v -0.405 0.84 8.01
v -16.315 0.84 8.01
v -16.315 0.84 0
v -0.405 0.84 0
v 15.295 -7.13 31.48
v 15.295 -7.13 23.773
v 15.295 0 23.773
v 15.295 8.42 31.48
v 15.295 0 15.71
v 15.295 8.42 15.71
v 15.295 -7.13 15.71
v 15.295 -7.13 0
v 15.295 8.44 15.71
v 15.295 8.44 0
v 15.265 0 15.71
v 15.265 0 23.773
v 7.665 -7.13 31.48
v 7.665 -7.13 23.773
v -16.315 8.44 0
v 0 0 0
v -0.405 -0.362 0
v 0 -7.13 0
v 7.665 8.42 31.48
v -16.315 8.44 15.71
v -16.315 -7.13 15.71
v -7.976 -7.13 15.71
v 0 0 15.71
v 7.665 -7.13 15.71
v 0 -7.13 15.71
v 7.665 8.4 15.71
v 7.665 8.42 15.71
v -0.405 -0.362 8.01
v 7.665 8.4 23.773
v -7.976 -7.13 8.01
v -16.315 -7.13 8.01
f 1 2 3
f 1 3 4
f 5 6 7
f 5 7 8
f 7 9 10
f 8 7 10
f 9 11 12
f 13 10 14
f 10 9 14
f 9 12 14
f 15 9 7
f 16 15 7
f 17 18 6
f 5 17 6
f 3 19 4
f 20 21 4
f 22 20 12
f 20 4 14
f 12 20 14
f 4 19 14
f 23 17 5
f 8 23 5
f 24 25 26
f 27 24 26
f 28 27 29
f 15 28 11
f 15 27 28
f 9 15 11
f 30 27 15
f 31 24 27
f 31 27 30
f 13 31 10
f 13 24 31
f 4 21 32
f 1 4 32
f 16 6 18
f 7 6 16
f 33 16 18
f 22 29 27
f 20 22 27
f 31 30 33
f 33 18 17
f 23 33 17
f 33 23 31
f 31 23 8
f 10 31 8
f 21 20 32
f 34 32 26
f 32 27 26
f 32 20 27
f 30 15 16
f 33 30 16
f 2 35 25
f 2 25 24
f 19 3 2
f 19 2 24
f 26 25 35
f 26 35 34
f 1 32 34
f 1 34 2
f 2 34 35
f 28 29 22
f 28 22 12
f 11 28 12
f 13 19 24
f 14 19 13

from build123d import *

# Parameters (mm, degrees)
F0_W      = 31.61
F0_H      = 15.57
F1_DEPTH  = 15.71
F2_W      = 7.63
F2_H      = 15.77
F3_DEPTH  = 15.55
F5_DEPTH  = 7.97
F7_DEPTH  = 25
F8_W      = 7.1303485631
F8_H      = 8.063195222
F9_DEPTH  = 25
F10_SIZE2 = 7.6
F10_SIZE  = 8.4


with BuildPart() as f1:
    # F0 (on Top) → F1 (new body)
    with BuildSketch(Plane.XY):
        with Locations((-0.5104932934, 0.6546514369)):
            Rectangle(F0_W, F0_H)
    extrude(amount=F1_DEPTH)

    # F2 (on face) → F3 (join)
    with BuildSketch(Plane.XZ.offset(7.1303485631)):
        with Locations((11.4795067066, 23.595)):
            Rectangle(F2_W, F2_H)
    extrude(amount=-F3_DEPTH)

    # F4 (on face) → F5 (cut)
    with BuildSketch(Plane.XZ.offset(7.1303485631)):
        Polygon((-0.4054932934, 0), (-0.4054932934, 8.01), (-8.0654932934, 8.01), (-16.3154932934, 8.01), (-16.3154932934, 0), align=None)
    extrude(amount=-F5_DEPTH, mode=Mode.SUBTRACT)

    # F6 (on face) → F7 (cut)
    with BuildSketch(Plane.XY.offset(15.71)):
        Polygon((0, 0), (-7.9760523513, -7.1303485631), (0, -7.1303485631), align=None)
    extrude(amount=-F7_DEPTH, mode=Mode.SUBTRACT)

    # F8 (on face) → F9 (cut)
    with BuildSketch(Plane.YZ.offset(15.2945067066)):
        with Locations((-3.5651742816, 19.741597611)):
            Rectangle(F8_W, F8_H)
    extrude(amount=-F9_DEPTH, mode=Mode.SUBTRACT)

    # F10
    f10_edges = [f1.edges().sort_by_distance(p)[0] for p in [
        (7.664507, 0, 19.741598),
    ]]
    f10_side = f1.faces().sort_by_distance((7.664507, 1.933934, 24.775126))[0]
    chamfer(f10_edges, length=F10_SIZE, length2=F10_SIZE2, reference=f10_side)


solid = f1.part
